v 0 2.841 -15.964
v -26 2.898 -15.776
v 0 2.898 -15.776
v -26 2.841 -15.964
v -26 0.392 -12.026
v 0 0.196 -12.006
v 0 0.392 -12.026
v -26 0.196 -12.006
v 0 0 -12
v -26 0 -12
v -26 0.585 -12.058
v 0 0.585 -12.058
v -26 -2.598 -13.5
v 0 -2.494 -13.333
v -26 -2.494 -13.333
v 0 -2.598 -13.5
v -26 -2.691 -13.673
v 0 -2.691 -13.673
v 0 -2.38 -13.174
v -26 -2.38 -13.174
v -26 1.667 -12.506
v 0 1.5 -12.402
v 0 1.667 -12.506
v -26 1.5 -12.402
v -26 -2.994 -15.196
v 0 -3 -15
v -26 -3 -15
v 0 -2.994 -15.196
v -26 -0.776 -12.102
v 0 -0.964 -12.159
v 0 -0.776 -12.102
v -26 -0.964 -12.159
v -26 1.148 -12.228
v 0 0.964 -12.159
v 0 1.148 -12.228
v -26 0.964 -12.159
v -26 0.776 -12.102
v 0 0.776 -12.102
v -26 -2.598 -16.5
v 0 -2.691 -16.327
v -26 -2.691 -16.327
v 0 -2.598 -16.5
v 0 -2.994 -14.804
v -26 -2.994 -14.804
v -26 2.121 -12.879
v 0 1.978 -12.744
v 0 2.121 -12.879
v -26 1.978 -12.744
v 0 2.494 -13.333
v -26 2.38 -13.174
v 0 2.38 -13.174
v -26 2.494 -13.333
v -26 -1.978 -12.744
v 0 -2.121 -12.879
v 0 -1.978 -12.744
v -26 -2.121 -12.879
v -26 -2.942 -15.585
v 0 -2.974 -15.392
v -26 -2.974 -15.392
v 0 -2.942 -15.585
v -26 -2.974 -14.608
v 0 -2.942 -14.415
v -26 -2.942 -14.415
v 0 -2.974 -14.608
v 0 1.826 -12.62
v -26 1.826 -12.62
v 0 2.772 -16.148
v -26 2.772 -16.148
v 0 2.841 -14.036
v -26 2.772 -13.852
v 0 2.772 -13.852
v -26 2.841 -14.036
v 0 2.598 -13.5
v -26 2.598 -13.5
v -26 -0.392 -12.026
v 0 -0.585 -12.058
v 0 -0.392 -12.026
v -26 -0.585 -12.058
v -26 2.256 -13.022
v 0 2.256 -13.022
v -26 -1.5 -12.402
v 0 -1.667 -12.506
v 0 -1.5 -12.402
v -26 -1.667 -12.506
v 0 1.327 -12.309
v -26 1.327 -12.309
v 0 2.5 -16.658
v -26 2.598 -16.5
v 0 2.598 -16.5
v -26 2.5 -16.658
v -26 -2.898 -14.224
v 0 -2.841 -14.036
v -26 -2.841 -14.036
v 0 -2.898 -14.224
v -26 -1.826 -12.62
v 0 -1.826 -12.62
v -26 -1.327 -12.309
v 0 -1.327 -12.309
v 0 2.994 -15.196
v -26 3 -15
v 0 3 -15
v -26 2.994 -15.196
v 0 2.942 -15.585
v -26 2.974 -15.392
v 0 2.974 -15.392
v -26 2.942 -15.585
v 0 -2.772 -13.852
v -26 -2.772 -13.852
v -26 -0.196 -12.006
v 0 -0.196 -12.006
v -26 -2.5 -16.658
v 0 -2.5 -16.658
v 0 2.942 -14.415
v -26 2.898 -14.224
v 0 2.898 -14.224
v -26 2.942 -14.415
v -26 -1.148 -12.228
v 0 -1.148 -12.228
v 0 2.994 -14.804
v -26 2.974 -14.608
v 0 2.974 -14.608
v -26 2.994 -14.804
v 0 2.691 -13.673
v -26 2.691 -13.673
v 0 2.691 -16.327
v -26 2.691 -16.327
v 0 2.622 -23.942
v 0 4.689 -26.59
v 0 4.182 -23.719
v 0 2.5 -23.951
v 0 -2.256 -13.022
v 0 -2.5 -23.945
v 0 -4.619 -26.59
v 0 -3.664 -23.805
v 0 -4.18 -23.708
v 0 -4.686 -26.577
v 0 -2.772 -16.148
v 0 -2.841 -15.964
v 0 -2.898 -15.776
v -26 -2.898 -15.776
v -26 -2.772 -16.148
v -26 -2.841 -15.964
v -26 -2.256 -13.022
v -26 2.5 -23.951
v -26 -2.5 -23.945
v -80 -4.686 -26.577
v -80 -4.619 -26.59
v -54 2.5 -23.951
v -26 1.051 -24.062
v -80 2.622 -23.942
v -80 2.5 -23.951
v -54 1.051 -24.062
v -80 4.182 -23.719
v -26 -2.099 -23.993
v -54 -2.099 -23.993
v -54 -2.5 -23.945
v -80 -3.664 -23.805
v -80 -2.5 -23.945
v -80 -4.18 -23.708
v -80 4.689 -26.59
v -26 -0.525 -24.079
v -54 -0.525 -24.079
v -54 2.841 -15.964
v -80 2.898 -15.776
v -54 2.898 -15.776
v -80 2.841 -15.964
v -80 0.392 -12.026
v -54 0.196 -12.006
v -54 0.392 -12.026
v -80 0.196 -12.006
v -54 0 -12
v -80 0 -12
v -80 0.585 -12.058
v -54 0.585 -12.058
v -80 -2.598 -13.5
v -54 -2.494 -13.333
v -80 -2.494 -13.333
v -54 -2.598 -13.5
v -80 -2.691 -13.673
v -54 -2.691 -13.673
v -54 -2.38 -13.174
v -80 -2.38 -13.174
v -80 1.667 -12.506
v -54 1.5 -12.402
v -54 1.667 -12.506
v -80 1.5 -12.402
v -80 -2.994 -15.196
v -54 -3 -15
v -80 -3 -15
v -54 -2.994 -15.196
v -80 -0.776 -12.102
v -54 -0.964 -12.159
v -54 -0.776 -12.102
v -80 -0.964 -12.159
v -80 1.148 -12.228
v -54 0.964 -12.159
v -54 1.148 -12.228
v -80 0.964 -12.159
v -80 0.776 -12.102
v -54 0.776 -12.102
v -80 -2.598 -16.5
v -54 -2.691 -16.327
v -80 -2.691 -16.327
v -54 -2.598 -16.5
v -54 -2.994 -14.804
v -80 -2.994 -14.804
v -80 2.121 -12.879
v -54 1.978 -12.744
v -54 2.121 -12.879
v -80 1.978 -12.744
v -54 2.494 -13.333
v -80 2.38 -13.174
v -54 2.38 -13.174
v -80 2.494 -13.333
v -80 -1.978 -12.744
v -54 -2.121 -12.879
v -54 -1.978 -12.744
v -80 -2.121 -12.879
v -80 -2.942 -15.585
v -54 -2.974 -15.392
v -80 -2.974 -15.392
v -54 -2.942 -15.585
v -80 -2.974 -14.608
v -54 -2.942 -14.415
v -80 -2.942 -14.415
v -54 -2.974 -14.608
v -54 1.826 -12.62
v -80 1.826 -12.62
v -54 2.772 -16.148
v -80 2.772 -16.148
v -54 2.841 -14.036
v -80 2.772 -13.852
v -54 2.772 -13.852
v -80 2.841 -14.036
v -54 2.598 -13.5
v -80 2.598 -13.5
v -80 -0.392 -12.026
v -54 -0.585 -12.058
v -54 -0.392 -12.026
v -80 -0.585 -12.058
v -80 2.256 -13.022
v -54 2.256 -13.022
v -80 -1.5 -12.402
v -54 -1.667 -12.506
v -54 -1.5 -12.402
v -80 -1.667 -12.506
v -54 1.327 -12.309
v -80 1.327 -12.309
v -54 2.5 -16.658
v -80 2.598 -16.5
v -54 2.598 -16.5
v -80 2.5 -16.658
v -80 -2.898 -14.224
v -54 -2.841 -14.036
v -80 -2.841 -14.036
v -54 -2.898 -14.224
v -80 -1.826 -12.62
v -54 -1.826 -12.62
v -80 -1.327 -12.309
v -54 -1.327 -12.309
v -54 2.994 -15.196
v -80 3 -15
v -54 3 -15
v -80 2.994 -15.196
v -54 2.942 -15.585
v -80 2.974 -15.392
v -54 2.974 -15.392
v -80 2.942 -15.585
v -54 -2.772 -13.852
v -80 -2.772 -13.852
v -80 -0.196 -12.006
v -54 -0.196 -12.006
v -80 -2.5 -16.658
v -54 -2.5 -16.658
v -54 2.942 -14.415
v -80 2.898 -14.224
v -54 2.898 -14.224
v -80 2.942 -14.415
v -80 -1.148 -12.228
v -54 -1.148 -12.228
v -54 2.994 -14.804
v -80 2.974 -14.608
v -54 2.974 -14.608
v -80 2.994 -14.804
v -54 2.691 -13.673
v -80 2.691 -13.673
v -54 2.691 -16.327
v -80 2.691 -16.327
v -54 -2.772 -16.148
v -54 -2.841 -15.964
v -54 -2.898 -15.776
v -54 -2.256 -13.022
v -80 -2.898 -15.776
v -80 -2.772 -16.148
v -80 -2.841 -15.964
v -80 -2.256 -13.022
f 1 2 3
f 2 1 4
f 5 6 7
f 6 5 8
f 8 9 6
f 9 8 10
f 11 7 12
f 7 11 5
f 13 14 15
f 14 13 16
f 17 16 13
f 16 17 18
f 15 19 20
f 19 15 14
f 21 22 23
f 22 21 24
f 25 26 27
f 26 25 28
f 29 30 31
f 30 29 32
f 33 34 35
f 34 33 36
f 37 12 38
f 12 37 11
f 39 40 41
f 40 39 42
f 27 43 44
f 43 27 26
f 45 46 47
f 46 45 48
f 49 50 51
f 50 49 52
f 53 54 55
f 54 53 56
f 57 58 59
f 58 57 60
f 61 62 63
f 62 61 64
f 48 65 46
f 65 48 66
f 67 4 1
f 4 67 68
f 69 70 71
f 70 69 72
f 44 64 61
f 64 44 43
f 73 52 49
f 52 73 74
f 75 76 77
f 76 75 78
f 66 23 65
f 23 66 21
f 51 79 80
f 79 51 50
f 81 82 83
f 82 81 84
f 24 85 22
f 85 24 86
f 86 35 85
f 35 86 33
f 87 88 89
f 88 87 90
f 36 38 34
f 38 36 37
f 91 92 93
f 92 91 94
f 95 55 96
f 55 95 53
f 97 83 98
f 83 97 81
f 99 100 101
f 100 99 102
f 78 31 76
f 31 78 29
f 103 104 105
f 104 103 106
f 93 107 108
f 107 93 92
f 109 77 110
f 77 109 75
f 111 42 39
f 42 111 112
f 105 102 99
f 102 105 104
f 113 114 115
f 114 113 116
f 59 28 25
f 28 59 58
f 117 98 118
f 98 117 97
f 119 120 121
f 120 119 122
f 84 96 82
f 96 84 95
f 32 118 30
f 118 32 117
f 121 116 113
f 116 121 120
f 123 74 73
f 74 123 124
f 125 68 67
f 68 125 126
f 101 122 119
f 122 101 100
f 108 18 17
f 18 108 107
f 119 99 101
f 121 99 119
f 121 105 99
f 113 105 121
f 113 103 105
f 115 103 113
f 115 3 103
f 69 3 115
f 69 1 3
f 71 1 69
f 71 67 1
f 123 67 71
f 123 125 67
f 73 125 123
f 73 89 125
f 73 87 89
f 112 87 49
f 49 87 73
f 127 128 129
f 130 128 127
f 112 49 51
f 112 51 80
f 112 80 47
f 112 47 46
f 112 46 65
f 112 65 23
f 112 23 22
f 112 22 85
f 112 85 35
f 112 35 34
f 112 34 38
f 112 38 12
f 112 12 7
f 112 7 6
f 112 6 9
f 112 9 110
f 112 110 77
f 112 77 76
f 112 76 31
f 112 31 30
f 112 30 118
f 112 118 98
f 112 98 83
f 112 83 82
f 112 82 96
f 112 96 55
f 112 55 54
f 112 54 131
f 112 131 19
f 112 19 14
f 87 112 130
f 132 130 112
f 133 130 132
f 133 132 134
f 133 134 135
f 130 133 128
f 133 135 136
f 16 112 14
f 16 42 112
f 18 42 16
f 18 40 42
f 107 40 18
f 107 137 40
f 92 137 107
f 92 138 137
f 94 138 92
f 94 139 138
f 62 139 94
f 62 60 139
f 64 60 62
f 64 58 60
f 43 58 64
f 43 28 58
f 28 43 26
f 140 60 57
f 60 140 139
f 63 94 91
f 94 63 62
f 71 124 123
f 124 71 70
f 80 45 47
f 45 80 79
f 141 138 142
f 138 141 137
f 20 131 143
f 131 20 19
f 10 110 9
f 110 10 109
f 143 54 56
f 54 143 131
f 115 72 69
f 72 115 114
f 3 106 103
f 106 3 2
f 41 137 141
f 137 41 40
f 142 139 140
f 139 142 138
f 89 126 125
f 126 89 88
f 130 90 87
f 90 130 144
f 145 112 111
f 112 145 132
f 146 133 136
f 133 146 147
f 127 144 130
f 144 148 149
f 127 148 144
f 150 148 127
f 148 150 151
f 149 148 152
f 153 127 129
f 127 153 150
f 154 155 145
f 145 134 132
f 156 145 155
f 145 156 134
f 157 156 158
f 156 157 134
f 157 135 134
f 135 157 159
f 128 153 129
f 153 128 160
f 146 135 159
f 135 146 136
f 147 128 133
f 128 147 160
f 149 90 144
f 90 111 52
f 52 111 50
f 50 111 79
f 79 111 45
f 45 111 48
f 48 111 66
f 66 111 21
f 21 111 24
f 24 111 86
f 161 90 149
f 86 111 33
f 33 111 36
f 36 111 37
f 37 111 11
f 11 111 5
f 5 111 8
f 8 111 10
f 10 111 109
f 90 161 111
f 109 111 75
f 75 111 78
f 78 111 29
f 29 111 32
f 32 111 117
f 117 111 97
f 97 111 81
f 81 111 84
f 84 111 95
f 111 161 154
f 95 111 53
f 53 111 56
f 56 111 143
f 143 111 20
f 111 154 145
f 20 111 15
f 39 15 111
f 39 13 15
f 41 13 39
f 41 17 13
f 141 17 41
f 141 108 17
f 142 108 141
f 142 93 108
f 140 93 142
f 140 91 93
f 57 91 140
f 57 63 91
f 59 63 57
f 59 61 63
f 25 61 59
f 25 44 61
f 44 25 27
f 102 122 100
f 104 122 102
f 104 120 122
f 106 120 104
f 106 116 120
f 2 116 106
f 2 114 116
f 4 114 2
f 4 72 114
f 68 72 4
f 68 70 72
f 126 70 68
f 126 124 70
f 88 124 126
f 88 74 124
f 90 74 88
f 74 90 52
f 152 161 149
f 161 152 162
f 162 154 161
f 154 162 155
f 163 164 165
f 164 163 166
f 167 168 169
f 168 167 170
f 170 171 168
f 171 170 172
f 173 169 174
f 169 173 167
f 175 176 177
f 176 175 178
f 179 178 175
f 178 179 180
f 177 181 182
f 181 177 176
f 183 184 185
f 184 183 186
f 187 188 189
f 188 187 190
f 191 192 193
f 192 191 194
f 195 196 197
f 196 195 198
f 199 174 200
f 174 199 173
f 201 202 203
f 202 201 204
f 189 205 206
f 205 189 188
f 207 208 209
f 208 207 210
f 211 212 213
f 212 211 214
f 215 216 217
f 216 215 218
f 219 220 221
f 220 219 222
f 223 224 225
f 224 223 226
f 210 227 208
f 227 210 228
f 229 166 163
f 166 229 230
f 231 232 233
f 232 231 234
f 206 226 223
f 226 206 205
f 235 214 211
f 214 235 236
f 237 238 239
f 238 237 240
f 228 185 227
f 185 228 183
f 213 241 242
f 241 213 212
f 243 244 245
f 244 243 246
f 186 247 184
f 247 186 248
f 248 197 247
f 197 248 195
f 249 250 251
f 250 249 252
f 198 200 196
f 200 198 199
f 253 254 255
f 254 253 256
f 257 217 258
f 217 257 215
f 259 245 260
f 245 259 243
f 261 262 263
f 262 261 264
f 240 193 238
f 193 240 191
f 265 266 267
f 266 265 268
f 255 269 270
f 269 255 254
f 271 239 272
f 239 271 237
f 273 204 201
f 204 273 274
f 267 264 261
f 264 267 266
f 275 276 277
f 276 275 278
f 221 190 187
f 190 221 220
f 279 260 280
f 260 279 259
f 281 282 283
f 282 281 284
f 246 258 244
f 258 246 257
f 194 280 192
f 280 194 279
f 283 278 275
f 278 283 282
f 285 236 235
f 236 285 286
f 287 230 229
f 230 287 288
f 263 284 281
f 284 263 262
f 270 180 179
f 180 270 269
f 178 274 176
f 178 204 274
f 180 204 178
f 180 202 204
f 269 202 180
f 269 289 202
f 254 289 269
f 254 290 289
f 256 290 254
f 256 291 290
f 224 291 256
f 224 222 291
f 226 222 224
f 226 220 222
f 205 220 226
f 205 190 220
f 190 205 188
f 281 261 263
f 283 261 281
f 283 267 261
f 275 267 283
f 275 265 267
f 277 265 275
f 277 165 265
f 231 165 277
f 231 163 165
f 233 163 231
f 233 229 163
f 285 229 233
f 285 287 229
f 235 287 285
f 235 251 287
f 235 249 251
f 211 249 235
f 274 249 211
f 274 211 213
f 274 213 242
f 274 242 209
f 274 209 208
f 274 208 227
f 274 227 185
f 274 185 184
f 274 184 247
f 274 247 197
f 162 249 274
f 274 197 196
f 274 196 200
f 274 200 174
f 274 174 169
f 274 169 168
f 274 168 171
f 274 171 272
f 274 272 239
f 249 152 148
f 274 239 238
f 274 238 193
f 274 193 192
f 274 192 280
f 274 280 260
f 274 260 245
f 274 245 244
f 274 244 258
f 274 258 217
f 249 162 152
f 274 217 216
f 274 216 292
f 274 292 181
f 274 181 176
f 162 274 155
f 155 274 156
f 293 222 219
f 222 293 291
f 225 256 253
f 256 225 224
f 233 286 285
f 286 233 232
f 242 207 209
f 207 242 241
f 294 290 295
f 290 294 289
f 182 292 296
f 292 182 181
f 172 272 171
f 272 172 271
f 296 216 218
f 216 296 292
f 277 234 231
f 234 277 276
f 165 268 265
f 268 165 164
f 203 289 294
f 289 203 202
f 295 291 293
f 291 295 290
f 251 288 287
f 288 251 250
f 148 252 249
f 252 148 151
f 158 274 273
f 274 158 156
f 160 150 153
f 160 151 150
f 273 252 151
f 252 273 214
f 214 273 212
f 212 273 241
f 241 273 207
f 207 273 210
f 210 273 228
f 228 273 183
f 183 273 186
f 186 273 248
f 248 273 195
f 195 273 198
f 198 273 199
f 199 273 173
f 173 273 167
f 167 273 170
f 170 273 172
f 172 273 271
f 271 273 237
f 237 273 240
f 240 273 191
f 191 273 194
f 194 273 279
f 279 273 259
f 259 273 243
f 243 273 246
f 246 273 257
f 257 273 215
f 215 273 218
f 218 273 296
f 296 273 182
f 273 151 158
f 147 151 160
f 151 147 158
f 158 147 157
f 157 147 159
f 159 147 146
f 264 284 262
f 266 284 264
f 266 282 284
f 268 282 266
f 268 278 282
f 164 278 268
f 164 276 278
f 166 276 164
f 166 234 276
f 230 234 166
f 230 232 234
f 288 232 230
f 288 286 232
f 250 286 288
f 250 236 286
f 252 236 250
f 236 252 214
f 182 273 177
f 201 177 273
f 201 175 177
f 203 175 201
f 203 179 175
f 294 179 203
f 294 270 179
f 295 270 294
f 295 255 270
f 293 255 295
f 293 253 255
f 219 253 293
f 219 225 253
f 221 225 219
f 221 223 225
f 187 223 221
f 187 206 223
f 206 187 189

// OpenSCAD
// file: definitions.scad
//
// GENERAL
//

$fn = 96;

PLAY = 0.4;
TOLERANCE = 0.17;
ATOM = 0.01;
WALL_THICKNESS = 1;

//
// SERVO (new)
//

SERVO_THICKNESS = 11.5;
SERVO_AXIS_RADIUS = 3;

//
// GEARS (new)
//

GEARS_DISTANCE = 14.3;
echo("GEARS_DISTANCE", GEARS_DISTANCE);

GEARS_THICKNESS = 5;
WHEEL_AXIS_TIGHTEN = TOLERANCE*0.75;
WHEEL_HOLE_DIAMETER = SERVO_AXIS_RADIUS*2 - WHEEL_AXIS_TIGHTEN;

//PINION_RADIUS = 5.6;
//WHEEL_RADIUS = 10.6;
WHEEL_PLATE_THICKNESS = 1;

//    Erlaubte Module nach DIN 780:
//    0.05 0.06 0.08 0.10 0.12 0.16
//    0.20 0.25 0.3  0.4  0.5  0.6
//    0.7  0.8  0.9  1    1.25 1.5
//    2    2.5  3    4    5    6
//    8    10   12   16   20   25
//    32   40   50   60
GEARS_MODULE = 0.65;



// Plate
PLATE_DIAMETER = 48;
//PLATE_SCREWS_BORDER_DISTANCE = 4;
PLATE_THICKNESS = 20.5;
PLATES_OVERLAP = 12;

PLATE_HEIGHT_SHORT = 15;


PLATE2_WHEEL_HEIGHT = 2.5;
PLATE2_HEIGHT = PLATE2_WHEEL_HEIGHT + GEARS_THICKNESS;

PLATE2_GROVE_HEIGHT = 2;
PLATE2_GROVE_THICKNESS = 5;
PLATE2_LEVER_HEIGHT = 2;

PLATE2_BAR_WIDTH = 5;
PLATE2_RADIUS_RECESSION = 1.5;

PLATE2_RADIUS = PLATE_DIAMETER/2 - PLATE2_RADIUS_RECESSION;

// Side screws
SCREW_PLATE_THICKNESS = 1;
SCREW2_DIAMETER = 2.9;
SCREW2_HEAD_DIAMETER = 5.5;
SCREW2_HEAD_THICKNESS = 2;
SCREW2_HEIGHT = 12; // overall

SERVO_SCREW1_H_DISPLACEMENT = 20.5;
SERVO_SCREW2_H_DISPLACEMENT = -9;
SERVO_SCREW_V_DISPLACEMENT = -11.5;
SERVO_SCREW_HEAD_EXTENT = 20;


HOLDER_ARM_HEIGHT = 13;
HOLDER_ARM_RADIUS_SHORTAGE = 15;
HOLDER_ARM_RADIUS = 3;
HOLDER_ARM_THICKNESS = 5;
HOLDER_THICKNESS = 3;
HOLDER_ANGLE = 20;
HOLDER_MODULES_SPACING = 10;

//////////////////////////////////////////////////////////////////////////

//
// SPECIFIC
//

//// Center screw
//SCREW_SHAFT_DIAMETER = 2;
//SCREW_THREAD_DIAMETER = 2.5;
//SCREW_HOLE_LENGTH = 5;



// PLATE 2
PINION_NECK_RADIUS = 6.5;
PINION_SCREW_HEAD_RADIUS = 3 + PLAY;

PINION_THICKNESS = 5.3;
PINION_HEIGHT = PINION_THICKNESS;

//PLATE2_HEIGHT = 7;
//PLATE2_H4 = PLATE2_HEIGHT;
//PLATE2_H3 = 5.5;
//PLATE2_H2 = 5;
//PLATE2_H1 = 3;

//PLATE2_R4 = PLATE2_R5;// - 1;

//PLATE2_R32 = (PLATE2_R4-1);
//PLATE2_R3 = PLATE2_R4 - 1;
//PLATE2_R2 = PLATE2_R3 - 1.5;
//PLATE2_R1 = PLATE2_R2 - 1.5;
//PLATE2_R1 = PLATE2_R5 - 7;
//PLATE2_R0 = PLATE2_R5 - 8;
//
//
//PLATE2_BAR_SPACE = 0.4;
//PLATE2_RING_THICKNESS = 0.7 * 2;
//
//PLATE2_RATCHET_RADIUS = 1;
//
//PLATE2_SPRING_THICKNESS = 0.7;
//PLATE2_SPRING_HEIGHT = 1;
//
//PLATE2_BAR_ANGLE = 20;

//PLATE2_NECK_HEIGHT = PLATE2_H4 - PINION_HEIGHT + 0.5;
//PLATE2_CROWN_HEIGHT = PLATE2_H4 - PLATE2_H3;

BOX_SIDE = 70;
PLATE2_BOX_INNER_HOLE_DIAMETER = 62;

WHEEL_THICKNESS = 3.5 -0.2;

SERVO_X_ADJUSTMENT = 0.5;
SERVO_X_POSITION = WHEEL_THICKNESS - SCREW_PLATE_THICKNESS + SERVO_X_ADJUSTMENT;
echo("Servo x pos: ", SERVO_X_POSITION);

HOLDER_RADIUS = 29.5;
HOLDER_SPINE_THICKNESS = 2.5 +1;

ZIP_TIE_SLIT_WIDTH = 3;
ZIP_TIE_SLIT_THICKNESS = 2;
ZIP_TIE_BUMP_RADIUS = 1;

echo("Total height: ", PLATE_THICKNESS+PLATE2_HEIGHT+PLAY+TOLERANCE);

// Snapping
SNAP_HOLE_DIAMETER = 4;

CUBE_CROWN_HEIGHT = 2.5;
CUBE_LEVER_THICKNESS = 4;
CUBE_SNAP_BALLS_RADIUS = 0.6;
DIGIT_SEGMENT_WIDTH = 3.5;

//
// DIGIT SEGMENTS
// 

SEGMENTS_TOP = ["a", "b", "c", "c", "b", "d", "d", "c", "a", "a"];
SEGMENTS_MID = ["j", "i", "k", "k", "k", "k", "k", "i", "k", "k"];
SEGMENTS_LOW = ["e", "f", "g", "h", "f", "h", "e", "f", "e", "h"];

//
// HELPERS
//

module spoke(radius, width, height) {
    translate([0, 0, height/2])
    intersection() {
        cube([radius*3, width, height], true);

        translate([0, 0, -height/2])
        scale([1, 1, height])
        cylinder(r=radius, true);
    }
}

module barrel(outer_radius, inner_radius, height) {
    scale([1, 1, height])
    difference() {
        cylinder(r=outer_radius);
        translate([0, 0, -0.5]) scale([1, 1, 2])
        cylinder(r=inner_radius);
    }
}

module box_sides(outer_side, thickness, height) {
    scale([1, 1, height/outer_side])
    translate([0, 0, outer_side/2])
    difference() {
        cube(outer_side, true);
        scale([1, 1, 2])
        cube(outer_side - thickness*2, true);
    }
}

module alignment_columns(column_extra=0, height=1) {
    r = PLATE_DIAMETER/2 - PLATE_SCREWS_BORDER_DISTANCE;
    n = 4;
    offset_angle = 45;
    scale([1, 1, height])
    for(a=[0:n-1])
        rotate([0, 0, a*360/n + offset_angle])
        translate([0, r, 0])
        cylinder(r=SNAP_HOLE_DIAMETER/2 + column_extra, true);        
}

function servo_cover_height() =
           PLATE_THICKNESS
           - (WHEEL_EXTERNAL_DIAMETER/2 - PINION_THICKNESS + SERVO_THICKNESS/2)
           -TOLERANCE;
// main file
include <definitions.scad>

module one_holder(height, upside_down) {
    // tenon
    tenon_z = upside_down ? height - HOLDER_ARM_HEIGHT : 0;
    translate([-HOLDER_ARM_RADIUS_SHORTAGE, 0, tenon_z]) {
        length = PLATE_DIAMETER/2-HOLDER_ARM_RADIUS_SHORTAGE;
        xs = HOLDER_THICKNESS/2;        
        cylinder(h=HOLDER_ARM_HEIGHT, r=HOLDER_ARM_RADIUS);
        translate([-length-xs, -HOLDER_ARM_THICKNESS/2, 0])
        cube([length+xs, HOLDER_ARM_THICKNESS, HOLDER_ARM_HEIGHT]);
    }

    // spine
    difference() {
        rotate([0, 0, 180 - HOLDER_ANGLE/2])
        intersection() {
            barrel(PLATE_DIAMETER/2+HOLDER_THICKNESS, PLATE_DIAMETER/2+TOLERANCE/2, height);
            cube([PLATE_DIAMETER, PLATE_DIAMETER, height]);
            rotate([0, 0, HOLDER_ANGLE-90])
            cube([PLATE_DIAMETER, PLATE_DIAMETER, height]);
        }
        
        // file flat
        r = (PLATE_DIAMETER/2 + HOLDER_THICKNESS) * cos(HOLDER_ANGLE/2);
        translate([-(PLATE_DIAMETER + r), -PLATE_DIAMETER/2, 0])
        cube([PLATE_DIAMETER, PLATE_DIAMETER, height]);
    }
}

HOLDER_HEIGHT = 50;

function get_holder_heights() = 
    let(module_height = PLATE_THICKNESS - PLATES_OVERLAP/2 + PLATE2_HEIGHT)
    [HOLDER_ARM_HEIGHT, module_height, module_height + HOLDER_MODULES_SPACING, HOLDER_ARM_HEIGHT];

module holder() {
    heights = get_holder_heights();
    one_holder(heights[0], false);

    translate([0, 0, heights[0]])
    one_holder(heights[1], false);

    translate([0, 0, heights[0]+heights[1]])
    one_holder(heights[2], true);

    translate([0, 0, heights[0]+heights[1]+heights[2]])
    one_holder(heights[3], true);
}

rotate([0, -90, 0])
holder();
